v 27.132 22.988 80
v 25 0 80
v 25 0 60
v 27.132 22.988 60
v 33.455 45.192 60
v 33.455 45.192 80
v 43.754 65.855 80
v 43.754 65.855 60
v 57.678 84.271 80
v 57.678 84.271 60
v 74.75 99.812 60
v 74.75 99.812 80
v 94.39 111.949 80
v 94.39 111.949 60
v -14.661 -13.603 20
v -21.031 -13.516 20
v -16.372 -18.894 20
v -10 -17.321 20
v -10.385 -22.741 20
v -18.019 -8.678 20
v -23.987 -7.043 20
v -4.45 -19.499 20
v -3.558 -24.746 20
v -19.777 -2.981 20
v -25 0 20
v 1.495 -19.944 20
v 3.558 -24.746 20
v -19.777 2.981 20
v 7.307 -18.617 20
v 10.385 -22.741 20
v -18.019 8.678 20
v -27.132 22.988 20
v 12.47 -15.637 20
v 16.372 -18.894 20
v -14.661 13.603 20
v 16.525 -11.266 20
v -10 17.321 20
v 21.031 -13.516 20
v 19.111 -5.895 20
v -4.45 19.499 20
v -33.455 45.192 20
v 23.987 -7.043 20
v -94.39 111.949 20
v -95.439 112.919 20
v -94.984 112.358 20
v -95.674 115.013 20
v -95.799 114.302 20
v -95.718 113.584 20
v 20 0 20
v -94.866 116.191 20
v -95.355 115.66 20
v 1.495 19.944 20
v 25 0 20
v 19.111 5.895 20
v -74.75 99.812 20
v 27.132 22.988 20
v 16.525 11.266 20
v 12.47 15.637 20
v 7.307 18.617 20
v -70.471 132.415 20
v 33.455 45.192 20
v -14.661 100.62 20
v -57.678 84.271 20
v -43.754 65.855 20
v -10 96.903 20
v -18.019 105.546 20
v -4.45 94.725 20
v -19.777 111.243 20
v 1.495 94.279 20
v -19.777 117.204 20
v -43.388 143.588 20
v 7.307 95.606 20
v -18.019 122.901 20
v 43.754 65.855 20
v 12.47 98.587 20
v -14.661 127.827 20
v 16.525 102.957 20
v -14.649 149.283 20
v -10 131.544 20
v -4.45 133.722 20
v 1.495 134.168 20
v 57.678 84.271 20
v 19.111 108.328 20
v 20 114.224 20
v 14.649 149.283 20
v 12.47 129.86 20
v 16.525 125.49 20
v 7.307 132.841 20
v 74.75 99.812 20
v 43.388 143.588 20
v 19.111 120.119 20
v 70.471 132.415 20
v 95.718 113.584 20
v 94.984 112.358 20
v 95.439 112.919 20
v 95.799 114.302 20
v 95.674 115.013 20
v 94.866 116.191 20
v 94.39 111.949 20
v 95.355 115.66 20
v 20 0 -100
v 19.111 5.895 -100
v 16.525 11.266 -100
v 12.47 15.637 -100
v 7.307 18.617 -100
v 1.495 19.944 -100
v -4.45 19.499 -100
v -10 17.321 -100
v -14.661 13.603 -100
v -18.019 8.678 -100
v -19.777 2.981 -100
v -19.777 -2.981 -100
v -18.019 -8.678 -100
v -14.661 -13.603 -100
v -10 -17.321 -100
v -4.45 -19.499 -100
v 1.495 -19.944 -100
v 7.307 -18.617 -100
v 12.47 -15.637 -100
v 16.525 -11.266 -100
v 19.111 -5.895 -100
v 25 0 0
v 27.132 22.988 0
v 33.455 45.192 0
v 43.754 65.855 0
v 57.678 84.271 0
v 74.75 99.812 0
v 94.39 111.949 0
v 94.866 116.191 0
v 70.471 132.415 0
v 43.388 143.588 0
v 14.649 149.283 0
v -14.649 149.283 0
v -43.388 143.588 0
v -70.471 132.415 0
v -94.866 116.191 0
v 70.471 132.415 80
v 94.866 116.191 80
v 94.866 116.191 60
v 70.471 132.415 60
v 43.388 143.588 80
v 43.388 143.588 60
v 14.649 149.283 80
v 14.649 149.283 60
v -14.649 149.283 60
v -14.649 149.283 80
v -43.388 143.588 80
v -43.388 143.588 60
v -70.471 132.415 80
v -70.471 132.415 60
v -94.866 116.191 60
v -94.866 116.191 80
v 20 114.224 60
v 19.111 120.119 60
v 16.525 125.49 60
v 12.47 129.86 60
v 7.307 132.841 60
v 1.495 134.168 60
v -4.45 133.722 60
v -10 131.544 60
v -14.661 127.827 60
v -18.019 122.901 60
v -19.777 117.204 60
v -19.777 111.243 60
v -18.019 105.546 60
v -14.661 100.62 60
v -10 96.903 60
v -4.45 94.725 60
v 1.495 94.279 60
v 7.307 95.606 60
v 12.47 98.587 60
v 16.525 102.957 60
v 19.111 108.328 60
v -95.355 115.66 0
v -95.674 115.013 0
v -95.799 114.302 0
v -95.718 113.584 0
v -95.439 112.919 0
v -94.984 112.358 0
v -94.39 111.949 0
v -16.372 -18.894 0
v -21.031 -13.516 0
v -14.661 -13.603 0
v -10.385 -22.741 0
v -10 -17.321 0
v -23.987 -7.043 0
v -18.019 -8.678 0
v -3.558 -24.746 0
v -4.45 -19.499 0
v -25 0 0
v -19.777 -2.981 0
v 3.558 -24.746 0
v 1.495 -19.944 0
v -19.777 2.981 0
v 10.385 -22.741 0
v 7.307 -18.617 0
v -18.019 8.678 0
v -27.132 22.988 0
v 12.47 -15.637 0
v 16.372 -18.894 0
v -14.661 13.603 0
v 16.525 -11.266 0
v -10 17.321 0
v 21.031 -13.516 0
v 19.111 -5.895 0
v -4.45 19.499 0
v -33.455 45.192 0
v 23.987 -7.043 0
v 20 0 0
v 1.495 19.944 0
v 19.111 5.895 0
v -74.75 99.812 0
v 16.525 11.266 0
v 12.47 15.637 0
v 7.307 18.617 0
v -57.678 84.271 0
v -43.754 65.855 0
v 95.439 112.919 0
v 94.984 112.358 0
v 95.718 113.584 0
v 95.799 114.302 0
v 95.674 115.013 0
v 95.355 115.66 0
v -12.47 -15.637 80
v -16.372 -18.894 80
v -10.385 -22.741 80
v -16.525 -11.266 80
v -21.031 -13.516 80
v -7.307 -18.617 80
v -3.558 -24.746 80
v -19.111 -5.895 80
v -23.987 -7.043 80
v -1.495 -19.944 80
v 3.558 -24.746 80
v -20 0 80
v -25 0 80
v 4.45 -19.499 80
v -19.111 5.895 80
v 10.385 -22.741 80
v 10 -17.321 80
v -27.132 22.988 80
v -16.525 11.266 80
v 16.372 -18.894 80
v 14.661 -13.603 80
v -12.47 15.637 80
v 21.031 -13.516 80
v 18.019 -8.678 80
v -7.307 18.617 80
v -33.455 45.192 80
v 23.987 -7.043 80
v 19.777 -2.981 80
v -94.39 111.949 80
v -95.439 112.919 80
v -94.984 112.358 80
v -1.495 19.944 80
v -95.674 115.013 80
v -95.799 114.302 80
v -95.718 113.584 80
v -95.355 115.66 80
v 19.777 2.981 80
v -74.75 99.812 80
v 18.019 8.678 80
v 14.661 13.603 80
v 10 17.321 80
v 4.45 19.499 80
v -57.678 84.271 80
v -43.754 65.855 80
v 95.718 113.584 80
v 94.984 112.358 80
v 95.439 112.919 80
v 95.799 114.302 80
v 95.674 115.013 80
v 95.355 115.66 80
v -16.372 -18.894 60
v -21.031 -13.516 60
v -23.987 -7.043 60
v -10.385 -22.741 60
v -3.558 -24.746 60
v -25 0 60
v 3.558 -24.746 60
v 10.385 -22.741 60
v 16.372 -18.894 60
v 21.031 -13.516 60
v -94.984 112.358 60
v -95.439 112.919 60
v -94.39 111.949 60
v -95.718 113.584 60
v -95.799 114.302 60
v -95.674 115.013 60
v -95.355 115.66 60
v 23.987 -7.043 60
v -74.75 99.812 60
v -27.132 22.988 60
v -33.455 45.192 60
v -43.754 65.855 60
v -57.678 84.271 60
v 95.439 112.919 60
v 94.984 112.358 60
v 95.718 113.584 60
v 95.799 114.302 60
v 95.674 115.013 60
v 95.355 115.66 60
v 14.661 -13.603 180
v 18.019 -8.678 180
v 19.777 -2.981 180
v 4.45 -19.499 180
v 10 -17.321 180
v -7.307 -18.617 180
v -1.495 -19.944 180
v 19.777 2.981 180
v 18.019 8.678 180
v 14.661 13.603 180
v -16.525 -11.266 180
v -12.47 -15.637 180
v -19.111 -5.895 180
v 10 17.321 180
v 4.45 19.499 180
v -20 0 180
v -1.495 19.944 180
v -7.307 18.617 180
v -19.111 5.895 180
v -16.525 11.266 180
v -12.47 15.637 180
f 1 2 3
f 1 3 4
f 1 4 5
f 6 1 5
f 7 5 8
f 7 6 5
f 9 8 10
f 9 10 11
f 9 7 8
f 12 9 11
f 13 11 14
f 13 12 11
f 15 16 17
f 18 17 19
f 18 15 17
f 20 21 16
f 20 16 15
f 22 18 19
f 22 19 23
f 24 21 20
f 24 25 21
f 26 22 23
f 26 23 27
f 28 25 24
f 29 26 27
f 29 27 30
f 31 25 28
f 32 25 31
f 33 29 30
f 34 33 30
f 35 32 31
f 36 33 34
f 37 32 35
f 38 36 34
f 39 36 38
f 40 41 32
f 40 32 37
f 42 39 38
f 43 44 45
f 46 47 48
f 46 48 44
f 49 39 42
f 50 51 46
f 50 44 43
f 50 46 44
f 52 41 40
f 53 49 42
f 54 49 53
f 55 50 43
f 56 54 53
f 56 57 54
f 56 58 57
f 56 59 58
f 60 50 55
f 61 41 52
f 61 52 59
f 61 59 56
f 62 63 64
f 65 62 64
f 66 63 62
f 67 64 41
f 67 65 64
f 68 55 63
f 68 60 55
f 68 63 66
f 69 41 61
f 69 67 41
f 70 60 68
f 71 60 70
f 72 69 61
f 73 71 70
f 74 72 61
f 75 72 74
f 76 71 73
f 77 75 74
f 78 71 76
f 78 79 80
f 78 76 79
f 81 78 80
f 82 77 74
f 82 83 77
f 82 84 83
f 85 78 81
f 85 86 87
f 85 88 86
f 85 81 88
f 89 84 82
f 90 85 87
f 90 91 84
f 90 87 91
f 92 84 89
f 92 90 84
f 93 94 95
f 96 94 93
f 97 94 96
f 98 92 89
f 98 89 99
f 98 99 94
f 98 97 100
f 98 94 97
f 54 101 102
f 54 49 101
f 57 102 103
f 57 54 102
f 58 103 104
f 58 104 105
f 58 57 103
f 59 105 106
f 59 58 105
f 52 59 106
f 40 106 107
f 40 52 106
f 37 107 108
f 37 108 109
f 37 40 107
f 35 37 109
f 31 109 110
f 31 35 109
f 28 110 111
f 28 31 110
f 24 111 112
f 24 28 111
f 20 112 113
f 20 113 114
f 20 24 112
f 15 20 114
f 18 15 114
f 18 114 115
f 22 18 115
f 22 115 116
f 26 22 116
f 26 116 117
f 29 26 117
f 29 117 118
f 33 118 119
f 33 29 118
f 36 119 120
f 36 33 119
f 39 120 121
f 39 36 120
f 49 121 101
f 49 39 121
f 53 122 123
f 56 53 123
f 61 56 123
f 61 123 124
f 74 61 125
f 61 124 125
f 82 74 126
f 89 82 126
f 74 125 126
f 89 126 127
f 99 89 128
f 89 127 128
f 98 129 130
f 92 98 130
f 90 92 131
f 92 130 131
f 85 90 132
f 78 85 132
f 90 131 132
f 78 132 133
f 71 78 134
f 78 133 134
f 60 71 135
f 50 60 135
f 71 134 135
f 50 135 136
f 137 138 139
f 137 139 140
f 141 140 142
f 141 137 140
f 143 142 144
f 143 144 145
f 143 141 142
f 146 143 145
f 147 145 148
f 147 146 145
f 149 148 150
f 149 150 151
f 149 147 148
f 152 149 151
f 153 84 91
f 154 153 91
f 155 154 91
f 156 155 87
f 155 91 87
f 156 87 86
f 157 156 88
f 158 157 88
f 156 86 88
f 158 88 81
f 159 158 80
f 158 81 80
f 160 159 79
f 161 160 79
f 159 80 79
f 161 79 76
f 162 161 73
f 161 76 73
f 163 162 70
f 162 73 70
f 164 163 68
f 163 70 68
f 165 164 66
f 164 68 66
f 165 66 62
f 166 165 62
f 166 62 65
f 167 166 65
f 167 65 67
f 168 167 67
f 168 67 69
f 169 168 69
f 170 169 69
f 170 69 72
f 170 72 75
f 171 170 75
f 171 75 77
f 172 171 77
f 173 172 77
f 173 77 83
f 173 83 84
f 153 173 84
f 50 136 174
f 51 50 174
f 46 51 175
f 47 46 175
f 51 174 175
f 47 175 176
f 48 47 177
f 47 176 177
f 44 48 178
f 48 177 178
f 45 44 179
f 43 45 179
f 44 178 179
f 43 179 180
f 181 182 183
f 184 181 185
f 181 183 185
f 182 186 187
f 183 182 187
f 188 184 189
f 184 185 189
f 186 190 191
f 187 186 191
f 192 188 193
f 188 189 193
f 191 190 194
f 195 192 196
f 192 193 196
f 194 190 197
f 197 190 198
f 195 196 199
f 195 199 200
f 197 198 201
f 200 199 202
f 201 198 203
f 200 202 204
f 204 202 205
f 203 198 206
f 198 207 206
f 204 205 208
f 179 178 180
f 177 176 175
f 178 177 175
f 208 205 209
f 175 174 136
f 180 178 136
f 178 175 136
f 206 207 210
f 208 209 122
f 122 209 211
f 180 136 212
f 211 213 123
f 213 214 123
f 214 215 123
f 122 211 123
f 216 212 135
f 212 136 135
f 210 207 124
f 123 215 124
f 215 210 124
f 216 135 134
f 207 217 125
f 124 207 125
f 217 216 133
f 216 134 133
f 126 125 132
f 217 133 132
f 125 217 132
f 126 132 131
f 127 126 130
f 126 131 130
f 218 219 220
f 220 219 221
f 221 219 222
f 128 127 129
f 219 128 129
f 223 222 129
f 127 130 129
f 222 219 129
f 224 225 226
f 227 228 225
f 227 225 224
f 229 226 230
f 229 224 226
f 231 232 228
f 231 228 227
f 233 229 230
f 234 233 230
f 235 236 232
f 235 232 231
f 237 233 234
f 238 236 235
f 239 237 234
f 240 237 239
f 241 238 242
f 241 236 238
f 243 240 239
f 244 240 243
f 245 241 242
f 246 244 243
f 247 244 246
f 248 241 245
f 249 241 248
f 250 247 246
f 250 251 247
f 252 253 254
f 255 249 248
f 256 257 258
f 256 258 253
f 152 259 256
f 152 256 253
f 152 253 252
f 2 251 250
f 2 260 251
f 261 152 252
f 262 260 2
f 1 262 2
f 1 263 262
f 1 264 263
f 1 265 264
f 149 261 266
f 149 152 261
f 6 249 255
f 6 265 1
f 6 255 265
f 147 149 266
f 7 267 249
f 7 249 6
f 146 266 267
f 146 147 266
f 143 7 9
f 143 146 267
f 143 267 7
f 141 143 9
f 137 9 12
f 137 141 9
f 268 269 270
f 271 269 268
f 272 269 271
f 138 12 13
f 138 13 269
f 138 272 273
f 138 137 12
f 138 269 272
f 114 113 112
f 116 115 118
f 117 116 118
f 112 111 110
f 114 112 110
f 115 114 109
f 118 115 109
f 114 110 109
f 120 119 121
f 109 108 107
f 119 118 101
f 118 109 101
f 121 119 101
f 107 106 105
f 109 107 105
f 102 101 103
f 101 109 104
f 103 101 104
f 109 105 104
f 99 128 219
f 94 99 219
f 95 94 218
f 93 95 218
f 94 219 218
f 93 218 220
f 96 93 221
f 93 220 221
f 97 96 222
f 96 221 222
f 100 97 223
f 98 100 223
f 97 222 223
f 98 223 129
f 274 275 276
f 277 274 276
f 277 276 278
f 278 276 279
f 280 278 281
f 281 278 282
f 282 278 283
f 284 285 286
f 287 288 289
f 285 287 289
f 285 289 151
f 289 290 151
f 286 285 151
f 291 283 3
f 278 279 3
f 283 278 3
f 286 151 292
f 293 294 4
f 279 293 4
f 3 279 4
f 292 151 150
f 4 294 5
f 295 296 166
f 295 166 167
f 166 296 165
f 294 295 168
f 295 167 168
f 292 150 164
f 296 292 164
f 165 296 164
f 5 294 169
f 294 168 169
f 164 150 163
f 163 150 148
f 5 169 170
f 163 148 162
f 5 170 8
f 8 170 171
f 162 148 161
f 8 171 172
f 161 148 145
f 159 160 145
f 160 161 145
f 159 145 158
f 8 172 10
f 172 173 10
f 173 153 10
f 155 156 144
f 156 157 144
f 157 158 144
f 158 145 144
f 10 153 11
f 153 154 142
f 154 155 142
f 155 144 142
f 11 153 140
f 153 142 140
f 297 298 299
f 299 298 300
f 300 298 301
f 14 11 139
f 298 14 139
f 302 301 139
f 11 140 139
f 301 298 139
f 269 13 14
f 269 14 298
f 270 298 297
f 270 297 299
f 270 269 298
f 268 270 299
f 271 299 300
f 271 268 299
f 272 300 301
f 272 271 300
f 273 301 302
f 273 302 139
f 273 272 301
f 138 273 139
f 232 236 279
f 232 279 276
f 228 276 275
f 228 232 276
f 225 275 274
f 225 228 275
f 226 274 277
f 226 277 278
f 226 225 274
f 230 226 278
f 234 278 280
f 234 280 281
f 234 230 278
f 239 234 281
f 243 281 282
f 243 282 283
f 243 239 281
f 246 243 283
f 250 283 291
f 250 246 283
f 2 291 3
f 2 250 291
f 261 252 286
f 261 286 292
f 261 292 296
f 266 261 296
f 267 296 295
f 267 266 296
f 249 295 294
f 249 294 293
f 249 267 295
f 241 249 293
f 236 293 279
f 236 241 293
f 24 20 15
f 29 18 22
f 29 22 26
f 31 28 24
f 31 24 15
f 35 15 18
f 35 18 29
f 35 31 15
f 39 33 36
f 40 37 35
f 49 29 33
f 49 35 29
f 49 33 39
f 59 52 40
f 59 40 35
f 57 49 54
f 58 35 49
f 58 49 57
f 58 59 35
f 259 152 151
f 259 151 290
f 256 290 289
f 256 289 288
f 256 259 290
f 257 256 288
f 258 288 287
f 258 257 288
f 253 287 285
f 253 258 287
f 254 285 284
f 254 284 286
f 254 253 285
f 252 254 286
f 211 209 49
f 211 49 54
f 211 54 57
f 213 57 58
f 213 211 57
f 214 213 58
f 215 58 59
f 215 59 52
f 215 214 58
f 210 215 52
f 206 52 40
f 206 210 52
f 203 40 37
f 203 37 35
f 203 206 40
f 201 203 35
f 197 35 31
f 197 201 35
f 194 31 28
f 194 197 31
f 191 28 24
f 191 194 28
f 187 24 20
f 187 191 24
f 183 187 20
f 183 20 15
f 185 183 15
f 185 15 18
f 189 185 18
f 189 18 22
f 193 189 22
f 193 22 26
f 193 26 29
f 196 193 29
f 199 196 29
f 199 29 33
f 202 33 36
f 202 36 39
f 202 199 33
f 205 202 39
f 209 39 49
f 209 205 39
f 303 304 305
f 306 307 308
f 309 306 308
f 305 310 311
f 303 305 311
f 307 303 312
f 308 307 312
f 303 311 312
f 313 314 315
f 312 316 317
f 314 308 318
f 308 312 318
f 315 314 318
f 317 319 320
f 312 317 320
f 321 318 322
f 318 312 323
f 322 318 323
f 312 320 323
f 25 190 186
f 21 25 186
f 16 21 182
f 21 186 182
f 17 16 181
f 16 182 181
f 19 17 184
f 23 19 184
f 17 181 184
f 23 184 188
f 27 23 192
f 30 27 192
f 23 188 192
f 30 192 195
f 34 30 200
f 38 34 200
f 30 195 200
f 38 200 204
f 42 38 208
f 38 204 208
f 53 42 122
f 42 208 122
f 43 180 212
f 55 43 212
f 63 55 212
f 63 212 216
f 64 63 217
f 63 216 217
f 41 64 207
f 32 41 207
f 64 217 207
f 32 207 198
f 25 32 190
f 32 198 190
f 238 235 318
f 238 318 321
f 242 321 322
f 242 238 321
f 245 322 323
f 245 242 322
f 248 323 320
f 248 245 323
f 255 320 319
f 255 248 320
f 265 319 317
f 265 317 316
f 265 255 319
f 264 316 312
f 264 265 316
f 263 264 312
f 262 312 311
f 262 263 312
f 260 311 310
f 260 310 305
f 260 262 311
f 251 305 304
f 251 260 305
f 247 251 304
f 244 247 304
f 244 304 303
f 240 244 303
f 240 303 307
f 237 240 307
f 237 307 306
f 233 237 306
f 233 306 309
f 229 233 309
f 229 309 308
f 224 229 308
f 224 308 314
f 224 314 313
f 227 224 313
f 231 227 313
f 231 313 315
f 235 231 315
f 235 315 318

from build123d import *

# Parameters (mm, degrees)
SKETCH1_R                = 20
BOSS_EXTRUDE1_DEPTH      = 20
SKETCH1_5_R              = 20
BOSS_EXTRUDE5_DEPTH      = 80
BOSS_EXTRUDE6_DEPTH      = 20
BOSS_EXTRUDE6_DEPTH_BACK = 100
SKETCH1_7_R              = 20
SKETCH2_R                = 20
BOSS_EXTRUDE7_DEPTH      = 120


with BuildPart() as part:
    # Sketch1 → Boss-Extrude1 (new body)
    with BuildSketch(Plane.XY):
        with BuildLine():
            ThreePointArc((94.866404449, 116.191072407), (0, 150), (-94.866404449, 116.191072407))
            ThreePointArc((-94.866404449, 116.191072407), (-95.784133661, 113.940110793), (-94.389995296, 111.948771216))
            ThreePointArc((-94.389995296, 111.948771216), (-43.754410473, 65.854952023), (-25, 0))
            ThreePointArc((-25, 0), (0, -25), (25, 0))
            ThreePointArc((25, 0), (43.754410473, 65.854952023), (94.389995296, 111.948771216))
            ThreePointArc((94.389995296, 111.948771216), (95.784133661, 113.940110793), (94.866404449, 116.191072407))
        make_face()
        Circle(SKETCH1_R, mode=Mode.SUBTRACT)
        with Locations((0, 114.223570247)):
            Circle(SKETCH1_R, mode=Mode.SUBTRACT)
    boss_extrude1 = extrude(amount=BOSS_EXTRUDE1_DEPTH)

    # Sketch1<5> → Boss-Extrude5 (add)
    with BuildSketch(Plane.XY):
        with Locations((0, 114.223570247)):
            Circle(SKETCH1_5_R)
    extrude(amount=BOSS_EXTRUDE5_DEPTH)

    # Mirror4: Boss-Extrude1 across plane
    add(boss_extrude1.mirror(Plane.XY.offset(40)))

    # Sketch2 → Boss-Extrude7 (add)
    with BuildSketch(Plane(origin=(0, 0, 60), x_dir=(-1, 0, 0), z_dir=(0, 0, -1))):
        Circle(SKETCH2_R)
    extrude(amount=-BOSS_EXTRUDE7_DEPTH)


with BuildPart() as body_2:
    # Sketch1<7> → Boss-Extrude6 (new, two sides: drawn at the far end of the back side and taken through both)
    with BuildSketch(Plane.XY.offset(-BOSS_EXTRUDE6_DEPTH_BACK)):
        Circle(SKETCH1_7_R)
    extrude(amount=BOSS_EXTRUDE6_DEPTH + BOSS_EXTRUDE6_DEPTH_BACK)


solid = Compound([part.part, body_2.part])
